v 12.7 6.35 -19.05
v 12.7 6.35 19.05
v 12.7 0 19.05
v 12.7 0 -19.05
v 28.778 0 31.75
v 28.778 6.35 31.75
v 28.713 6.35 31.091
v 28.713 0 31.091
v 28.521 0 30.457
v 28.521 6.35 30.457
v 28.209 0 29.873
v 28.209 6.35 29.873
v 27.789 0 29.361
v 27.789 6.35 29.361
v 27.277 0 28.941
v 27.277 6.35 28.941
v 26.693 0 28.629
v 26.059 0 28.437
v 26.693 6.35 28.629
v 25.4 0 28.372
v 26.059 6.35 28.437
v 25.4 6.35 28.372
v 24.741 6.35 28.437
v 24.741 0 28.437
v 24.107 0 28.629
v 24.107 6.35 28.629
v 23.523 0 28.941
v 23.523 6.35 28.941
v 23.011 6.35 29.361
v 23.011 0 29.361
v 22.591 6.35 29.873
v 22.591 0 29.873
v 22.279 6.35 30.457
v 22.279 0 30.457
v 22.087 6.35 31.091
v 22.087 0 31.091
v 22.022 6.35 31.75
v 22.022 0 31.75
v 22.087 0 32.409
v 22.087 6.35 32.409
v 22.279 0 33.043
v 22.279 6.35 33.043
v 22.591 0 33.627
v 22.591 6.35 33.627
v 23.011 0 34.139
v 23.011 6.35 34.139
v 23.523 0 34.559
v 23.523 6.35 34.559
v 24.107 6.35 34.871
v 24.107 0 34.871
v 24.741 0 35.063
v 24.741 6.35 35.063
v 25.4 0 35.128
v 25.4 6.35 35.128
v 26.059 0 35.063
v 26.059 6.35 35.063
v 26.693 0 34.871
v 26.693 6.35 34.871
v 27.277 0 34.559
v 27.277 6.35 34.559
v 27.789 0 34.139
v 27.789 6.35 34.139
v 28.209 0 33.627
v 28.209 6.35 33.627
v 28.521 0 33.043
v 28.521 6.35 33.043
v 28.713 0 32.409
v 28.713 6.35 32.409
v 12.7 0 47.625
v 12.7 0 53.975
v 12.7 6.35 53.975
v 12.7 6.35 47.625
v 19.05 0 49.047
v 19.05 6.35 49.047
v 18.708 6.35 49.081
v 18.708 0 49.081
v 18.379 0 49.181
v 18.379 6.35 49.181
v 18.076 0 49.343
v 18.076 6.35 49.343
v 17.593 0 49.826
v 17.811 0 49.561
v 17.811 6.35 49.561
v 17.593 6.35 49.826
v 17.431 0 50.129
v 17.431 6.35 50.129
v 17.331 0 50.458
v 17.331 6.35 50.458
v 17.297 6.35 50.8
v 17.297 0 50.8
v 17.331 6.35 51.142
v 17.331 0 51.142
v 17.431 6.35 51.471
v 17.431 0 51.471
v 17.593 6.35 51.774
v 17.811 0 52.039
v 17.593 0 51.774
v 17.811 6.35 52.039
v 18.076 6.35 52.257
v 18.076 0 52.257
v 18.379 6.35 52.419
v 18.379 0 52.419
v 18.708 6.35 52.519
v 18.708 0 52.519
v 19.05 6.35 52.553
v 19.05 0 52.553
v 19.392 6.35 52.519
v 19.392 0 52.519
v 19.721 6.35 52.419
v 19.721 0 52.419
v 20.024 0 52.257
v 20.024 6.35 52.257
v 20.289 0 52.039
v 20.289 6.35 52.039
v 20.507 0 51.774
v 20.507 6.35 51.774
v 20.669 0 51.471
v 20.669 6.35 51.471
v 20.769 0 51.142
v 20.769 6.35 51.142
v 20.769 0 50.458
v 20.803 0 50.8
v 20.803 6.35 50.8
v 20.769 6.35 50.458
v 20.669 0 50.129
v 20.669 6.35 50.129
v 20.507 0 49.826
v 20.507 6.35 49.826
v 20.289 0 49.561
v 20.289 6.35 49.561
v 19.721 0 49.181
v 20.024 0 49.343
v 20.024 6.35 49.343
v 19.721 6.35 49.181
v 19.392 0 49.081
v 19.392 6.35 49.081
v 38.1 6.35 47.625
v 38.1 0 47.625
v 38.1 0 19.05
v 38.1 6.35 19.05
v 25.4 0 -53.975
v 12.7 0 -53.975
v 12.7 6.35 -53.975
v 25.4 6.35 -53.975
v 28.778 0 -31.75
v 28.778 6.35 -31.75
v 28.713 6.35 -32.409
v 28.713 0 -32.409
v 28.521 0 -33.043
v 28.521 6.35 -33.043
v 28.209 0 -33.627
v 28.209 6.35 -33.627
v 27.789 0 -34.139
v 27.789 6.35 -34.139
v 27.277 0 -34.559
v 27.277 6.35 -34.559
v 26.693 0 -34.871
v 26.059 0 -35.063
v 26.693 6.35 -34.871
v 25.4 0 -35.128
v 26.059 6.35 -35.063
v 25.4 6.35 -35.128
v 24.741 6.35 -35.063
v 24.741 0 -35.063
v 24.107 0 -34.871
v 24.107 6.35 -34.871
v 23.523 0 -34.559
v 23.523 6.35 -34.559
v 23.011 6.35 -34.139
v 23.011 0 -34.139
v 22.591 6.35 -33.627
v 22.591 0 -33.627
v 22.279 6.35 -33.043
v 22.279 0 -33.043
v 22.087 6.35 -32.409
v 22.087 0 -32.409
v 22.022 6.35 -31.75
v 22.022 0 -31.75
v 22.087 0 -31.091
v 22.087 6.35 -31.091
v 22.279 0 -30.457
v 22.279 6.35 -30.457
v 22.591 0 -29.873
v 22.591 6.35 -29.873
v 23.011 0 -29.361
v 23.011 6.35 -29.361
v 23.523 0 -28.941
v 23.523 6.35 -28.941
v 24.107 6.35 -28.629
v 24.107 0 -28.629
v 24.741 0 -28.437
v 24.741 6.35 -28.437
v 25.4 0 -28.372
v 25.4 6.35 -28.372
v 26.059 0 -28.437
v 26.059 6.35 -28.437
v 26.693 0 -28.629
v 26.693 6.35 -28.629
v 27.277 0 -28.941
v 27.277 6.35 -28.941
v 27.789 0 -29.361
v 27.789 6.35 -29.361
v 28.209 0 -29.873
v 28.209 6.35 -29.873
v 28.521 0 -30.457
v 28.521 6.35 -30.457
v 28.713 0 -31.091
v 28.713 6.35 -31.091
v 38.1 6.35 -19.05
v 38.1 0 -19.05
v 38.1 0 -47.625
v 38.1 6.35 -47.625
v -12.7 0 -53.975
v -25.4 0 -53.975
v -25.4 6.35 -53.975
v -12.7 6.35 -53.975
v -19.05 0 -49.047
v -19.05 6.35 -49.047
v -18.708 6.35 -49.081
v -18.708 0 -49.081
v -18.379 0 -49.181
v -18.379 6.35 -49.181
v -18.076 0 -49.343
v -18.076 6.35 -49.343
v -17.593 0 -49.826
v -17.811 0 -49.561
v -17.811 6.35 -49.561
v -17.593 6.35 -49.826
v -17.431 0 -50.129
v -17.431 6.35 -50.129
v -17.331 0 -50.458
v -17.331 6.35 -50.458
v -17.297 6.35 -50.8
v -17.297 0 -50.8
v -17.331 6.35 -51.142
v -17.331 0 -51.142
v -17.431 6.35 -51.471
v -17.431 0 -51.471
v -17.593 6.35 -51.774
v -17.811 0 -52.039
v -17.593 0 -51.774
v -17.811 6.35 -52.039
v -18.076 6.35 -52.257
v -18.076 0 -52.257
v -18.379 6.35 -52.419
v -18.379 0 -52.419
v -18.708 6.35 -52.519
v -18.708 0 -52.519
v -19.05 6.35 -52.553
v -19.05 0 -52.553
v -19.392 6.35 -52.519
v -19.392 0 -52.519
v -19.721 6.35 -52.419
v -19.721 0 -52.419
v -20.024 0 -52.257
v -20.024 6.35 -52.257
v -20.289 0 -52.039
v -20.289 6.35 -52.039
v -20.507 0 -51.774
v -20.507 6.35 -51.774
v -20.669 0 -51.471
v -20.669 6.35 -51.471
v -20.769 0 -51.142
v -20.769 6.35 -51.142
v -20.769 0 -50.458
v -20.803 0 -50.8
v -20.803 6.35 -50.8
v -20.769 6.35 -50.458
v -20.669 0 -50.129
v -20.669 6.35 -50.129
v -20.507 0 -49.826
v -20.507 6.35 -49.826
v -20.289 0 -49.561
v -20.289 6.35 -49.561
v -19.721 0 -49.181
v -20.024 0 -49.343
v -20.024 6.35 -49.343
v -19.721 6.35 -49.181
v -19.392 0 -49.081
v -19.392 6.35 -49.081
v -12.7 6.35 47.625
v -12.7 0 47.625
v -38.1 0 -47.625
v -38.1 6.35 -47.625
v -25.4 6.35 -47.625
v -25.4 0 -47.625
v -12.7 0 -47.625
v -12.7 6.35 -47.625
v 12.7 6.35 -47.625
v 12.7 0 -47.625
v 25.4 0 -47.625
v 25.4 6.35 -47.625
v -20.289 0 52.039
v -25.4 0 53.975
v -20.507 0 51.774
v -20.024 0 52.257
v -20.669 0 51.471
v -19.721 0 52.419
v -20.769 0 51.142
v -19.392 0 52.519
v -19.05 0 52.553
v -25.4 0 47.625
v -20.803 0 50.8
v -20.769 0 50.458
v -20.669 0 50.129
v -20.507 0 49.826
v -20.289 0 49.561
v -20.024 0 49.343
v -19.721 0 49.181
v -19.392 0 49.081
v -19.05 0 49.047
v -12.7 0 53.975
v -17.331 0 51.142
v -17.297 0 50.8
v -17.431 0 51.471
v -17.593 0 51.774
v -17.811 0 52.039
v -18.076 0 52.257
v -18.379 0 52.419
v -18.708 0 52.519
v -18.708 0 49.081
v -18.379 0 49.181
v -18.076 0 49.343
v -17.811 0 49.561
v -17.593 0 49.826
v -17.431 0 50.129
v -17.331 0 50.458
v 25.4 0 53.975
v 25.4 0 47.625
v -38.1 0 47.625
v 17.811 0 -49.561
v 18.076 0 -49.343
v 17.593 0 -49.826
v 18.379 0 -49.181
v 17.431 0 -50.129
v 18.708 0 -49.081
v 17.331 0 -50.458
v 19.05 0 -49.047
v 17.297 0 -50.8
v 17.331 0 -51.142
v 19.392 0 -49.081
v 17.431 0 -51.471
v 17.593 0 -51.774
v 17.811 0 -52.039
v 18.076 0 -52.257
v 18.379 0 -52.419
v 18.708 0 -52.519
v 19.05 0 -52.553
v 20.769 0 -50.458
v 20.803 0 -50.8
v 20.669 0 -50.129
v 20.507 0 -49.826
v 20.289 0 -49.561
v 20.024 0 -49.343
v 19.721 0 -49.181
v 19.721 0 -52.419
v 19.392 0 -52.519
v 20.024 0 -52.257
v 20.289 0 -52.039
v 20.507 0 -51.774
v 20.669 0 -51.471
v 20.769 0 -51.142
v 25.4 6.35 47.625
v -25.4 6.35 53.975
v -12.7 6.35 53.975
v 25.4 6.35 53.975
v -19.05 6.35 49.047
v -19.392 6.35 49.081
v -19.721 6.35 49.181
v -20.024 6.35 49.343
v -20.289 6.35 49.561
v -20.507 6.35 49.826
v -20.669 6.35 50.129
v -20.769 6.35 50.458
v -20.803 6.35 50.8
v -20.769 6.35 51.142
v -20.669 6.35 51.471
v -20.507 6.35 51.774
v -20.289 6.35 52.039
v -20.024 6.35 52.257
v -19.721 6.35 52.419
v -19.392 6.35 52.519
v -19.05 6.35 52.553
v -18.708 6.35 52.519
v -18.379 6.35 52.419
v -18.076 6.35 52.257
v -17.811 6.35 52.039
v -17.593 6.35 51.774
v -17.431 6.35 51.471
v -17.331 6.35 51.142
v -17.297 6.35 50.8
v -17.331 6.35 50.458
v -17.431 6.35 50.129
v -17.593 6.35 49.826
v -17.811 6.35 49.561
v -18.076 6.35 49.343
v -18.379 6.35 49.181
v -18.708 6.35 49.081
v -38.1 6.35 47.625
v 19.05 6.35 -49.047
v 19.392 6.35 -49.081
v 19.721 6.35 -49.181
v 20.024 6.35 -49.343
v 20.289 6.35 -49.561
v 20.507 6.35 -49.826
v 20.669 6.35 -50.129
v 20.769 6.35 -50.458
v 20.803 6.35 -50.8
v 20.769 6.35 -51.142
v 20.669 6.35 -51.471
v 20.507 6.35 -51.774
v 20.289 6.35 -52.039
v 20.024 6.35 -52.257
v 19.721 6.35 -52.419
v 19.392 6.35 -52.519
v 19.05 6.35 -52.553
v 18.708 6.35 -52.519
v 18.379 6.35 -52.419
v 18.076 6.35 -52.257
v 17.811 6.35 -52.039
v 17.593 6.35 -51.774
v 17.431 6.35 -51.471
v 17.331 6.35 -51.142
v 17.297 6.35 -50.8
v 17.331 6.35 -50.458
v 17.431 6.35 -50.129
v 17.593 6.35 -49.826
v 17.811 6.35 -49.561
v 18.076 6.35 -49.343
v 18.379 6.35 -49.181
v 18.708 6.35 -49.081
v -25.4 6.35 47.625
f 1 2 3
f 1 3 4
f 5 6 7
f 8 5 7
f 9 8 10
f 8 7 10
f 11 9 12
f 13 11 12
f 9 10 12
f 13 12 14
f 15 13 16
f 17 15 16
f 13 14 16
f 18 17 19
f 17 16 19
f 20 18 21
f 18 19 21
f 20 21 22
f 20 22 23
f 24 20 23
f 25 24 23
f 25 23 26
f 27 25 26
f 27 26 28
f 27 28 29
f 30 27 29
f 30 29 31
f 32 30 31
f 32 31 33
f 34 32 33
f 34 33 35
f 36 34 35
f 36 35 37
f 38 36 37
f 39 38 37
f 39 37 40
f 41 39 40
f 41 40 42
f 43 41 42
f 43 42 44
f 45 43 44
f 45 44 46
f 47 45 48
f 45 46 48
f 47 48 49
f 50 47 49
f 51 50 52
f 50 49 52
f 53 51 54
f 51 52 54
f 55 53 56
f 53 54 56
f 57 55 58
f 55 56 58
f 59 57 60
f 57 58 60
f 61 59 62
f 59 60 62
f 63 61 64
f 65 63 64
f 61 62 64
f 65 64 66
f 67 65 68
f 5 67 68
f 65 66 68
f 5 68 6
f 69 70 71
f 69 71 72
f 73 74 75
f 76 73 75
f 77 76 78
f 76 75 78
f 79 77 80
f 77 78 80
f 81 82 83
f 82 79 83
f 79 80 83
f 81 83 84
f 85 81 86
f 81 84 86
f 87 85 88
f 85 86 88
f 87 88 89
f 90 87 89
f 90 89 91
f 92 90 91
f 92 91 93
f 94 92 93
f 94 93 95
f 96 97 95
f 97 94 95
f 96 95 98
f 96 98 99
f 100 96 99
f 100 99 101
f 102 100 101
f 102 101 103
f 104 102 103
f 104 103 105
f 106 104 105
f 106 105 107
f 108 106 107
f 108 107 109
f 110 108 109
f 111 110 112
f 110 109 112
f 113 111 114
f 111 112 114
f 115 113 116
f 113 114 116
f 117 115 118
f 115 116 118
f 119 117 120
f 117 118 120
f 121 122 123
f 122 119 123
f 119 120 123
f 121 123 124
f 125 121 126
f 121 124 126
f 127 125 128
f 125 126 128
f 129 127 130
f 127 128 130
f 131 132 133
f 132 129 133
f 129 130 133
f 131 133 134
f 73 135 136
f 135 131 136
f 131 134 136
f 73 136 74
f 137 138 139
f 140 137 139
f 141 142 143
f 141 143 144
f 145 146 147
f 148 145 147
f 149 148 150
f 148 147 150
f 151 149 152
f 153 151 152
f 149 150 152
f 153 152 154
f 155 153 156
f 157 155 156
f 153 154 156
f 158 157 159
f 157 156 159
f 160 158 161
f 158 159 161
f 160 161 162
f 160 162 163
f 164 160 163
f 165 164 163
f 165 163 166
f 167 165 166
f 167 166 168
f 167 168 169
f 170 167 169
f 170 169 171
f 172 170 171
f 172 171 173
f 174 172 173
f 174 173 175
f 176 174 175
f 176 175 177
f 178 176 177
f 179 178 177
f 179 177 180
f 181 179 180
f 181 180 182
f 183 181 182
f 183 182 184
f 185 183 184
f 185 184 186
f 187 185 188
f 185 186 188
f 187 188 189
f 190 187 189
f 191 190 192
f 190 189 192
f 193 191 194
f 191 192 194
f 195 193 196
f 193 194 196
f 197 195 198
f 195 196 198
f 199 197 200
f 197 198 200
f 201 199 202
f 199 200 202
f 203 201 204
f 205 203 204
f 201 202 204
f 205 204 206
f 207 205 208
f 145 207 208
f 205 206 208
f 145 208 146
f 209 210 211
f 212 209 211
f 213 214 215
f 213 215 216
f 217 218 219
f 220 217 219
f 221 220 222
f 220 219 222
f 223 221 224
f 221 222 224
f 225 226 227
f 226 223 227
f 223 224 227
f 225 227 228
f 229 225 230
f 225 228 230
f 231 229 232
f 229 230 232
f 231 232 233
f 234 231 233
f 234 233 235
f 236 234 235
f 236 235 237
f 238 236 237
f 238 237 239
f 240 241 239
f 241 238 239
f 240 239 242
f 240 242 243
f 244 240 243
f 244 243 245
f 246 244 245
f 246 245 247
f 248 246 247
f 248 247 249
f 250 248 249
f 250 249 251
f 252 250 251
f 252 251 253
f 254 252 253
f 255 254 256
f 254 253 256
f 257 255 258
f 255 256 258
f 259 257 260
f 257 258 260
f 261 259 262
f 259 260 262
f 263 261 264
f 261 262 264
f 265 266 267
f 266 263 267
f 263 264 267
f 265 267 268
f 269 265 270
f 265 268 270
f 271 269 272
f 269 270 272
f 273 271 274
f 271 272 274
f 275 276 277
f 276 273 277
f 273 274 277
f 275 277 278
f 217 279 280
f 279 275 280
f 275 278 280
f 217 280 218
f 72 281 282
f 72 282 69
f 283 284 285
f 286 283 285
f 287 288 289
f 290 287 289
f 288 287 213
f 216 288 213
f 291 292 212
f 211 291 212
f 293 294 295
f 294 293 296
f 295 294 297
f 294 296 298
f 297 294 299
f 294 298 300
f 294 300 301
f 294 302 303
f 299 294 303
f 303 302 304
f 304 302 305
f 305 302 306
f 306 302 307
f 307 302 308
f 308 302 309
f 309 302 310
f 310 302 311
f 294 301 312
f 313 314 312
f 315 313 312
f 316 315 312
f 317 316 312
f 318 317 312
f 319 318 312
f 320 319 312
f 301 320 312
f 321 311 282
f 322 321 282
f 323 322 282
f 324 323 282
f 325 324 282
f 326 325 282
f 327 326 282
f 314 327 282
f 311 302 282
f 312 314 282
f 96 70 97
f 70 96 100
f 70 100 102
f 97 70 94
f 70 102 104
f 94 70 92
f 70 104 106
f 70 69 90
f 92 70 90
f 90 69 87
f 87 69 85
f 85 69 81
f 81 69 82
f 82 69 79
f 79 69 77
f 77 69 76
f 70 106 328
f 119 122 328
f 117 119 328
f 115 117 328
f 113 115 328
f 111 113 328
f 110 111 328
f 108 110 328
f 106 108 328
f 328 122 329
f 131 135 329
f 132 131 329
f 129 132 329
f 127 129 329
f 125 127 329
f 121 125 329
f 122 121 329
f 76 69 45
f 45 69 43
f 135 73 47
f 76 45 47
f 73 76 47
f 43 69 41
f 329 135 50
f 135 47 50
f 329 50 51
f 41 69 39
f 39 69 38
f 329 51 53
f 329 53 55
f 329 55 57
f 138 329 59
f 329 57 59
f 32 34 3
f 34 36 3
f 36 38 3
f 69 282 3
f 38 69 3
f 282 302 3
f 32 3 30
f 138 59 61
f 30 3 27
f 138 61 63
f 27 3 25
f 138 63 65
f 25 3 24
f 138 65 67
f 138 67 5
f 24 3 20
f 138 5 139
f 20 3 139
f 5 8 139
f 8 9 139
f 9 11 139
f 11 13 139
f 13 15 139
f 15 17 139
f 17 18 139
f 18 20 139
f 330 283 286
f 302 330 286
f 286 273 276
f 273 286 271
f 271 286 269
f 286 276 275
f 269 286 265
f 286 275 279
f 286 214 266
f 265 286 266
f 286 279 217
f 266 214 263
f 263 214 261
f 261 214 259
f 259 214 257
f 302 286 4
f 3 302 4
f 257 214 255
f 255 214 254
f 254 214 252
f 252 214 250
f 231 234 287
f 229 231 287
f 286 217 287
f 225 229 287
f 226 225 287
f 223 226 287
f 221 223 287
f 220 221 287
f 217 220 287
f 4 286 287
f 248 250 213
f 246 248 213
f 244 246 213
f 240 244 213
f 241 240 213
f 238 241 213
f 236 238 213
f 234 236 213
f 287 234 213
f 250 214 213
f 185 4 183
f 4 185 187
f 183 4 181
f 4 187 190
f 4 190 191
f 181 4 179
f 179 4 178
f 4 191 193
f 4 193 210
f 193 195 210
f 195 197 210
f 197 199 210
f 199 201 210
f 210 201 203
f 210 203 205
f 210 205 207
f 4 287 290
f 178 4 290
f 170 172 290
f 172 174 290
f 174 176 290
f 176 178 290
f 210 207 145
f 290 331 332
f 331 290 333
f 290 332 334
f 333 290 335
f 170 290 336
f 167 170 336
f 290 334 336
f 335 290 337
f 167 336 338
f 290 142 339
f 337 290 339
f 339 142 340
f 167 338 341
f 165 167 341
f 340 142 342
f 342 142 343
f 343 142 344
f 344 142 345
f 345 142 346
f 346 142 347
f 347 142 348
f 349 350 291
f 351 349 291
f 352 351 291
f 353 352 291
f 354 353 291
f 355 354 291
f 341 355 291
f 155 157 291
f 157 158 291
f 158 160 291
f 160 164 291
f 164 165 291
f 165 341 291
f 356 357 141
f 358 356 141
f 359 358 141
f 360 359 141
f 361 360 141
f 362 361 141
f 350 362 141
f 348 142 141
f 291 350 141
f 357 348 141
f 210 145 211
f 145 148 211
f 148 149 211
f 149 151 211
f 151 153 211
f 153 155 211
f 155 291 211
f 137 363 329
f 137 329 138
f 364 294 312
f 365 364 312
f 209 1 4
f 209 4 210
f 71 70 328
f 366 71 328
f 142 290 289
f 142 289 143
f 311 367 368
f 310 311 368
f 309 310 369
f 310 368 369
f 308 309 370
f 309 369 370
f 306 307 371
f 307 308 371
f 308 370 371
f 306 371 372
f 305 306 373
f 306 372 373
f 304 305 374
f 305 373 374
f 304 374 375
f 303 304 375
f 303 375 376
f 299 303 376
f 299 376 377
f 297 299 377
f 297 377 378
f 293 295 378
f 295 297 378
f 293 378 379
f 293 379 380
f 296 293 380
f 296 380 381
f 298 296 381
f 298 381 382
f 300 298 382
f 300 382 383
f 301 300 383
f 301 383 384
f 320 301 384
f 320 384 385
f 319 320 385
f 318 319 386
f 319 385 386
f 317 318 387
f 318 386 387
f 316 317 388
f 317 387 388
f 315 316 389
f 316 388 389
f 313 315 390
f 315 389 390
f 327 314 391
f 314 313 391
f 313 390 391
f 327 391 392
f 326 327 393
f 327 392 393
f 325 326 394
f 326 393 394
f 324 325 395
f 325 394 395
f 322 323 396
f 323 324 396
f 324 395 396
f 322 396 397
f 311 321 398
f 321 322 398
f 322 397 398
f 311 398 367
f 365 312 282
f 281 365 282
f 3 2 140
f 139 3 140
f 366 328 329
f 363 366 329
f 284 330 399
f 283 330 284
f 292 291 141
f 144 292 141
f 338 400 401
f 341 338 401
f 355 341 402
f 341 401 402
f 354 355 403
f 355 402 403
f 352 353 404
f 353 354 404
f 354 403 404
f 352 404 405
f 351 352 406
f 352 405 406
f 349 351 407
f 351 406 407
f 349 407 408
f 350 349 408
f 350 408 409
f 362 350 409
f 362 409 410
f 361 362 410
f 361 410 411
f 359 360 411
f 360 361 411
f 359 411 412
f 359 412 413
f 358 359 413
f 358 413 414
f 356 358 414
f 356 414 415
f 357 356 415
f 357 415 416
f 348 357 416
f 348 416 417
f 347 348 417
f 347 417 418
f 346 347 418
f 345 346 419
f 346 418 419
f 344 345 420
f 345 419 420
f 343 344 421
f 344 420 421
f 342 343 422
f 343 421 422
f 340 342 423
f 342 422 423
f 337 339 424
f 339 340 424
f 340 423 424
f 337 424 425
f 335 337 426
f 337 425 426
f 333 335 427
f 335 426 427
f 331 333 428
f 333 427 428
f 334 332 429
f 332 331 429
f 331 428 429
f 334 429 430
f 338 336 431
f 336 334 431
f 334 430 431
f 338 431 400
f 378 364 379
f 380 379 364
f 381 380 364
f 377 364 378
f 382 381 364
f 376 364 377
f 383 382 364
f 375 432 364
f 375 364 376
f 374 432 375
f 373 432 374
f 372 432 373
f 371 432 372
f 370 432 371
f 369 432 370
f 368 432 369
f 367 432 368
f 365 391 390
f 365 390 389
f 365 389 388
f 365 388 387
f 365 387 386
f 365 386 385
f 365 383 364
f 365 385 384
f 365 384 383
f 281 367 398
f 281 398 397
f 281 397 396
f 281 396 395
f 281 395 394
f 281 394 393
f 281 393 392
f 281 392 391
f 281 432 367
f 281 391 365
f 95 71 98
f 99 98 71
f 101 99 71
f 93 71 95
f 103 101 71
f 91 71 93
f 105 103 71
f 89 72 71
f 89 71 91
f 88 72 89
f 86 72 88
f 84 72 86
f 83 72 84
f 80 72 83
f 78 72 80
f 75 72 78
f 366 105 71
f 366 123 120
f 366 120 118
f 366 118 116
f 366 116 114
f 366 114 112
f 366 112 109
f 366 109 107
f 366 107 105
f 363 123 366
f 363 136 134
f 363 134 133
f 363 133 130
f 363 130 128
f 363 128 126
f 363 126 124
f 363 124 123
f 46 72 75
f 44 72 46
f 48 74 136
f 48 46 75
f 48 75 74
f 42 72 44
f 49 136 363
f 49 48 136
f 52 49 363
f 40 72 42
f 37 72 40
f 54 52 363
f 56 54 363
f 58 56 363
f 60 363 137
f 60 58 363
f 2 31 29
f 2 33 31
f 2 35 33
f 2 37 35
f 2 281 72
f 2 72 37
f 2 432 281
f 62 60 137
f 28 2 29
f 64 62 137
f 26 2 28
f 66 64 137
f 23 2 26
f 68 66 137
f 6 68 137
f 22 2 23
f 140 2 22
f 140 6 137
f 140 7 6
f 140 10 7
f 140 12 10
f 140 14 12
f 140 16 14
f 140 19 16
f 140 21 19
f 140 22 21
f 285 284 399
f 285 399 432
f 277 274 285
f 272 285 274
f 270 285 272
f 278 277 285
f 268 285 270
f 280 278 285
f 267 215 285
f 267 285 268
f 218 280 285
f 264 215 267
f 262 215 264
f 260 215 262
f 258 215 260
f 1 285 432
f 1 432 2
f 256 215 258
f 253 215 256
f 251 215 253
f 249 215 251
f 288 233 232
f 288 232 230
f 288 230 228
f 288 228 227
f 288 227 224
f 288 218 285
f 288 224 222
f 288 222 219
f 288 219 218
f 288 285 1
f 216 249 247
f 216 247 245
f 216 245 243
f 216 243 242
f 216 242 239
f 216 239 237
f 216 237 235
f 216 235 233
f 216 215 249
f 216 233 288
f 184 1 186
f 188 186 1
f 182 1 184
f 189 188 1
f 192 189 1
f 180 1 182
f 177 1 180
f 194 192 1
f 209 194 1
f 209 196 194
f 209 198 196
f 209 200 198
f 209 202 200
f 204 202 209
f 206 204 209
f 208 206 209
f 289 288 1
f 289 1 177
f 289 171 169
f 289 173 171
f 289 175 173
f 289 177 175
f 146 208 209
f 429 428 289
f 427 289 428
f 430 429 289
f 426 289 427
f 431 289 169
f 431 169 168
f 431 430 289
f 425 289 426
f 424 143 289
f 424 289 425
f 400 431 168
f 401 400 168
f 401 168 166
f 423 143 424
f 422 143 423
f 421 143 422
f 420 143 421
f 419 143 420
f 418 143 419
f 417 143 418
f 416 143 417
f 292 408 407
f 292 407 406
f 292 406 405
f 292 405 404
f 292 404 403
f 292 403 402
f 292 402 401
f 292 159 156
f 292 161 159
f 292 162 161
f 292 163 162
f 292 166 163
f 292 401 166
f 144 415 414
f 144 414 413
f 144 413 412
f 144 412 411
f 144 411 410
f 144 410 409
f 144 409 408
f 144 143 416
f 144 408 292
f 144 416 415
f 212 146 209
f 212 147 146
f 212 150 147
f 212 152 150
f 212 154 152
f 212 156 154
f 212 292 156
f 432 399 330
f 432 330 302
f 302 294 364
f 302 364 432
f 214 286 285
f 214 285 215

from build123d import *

# Parameters (mm, degrees)
SKETCH1_W                 = 76.2
SKETCH1_H                 = 107.95
BOSS_EXTRUDE1_DEPTH       = 6.35
SKETCH2_R                 = 1.7526
SKETCH2_W                 = 12.7
SKETCH2_H                 = 6.35
SKETCH2_W_2               = 25.4
CUT_EXTRUDE1_DEPTH        = 6.35
CUT_EXTRUDE2_REACH        = 68.372
SKETCH3_W                 = 25.4
SKETCH3_H                 = 38.1
F_6_CLEARANCE_HOLE1_D     = 3.5052
F_6_CLEARANCE_HOLE1_DEPTH = 6.35
F_6_CLEARANCE_HOLE1_TIP   = 1.053068321
F_1_4_CLEARANCE_HOLE1_D   = 6.7564


with BuildPart() as part:
    # Sketch1 → Boss-Extrude1 (new body)
    with BuildSketch(Plane(origin=(0, 0, 0), x_dir=(1, 0, 0), z_dir=(0, 1, 0))):
        Rectangle(SKETCH1_W, SKETCH1_H)
    extrude(amount=BOSS_EXTRUDE1_DEPTH)

    # Sketch2 → Cut-Extrude1 (cut)
    with BuildSketch(Plane(origin=(0, 6.35, 0), x_dir=(1, 0, 0), z_dir=(0, 1, 0))):
        with Locations(Location((-19.05, 50.8, 0), (0, 0, 270))):
            Circle(SKETCH2_R)
        with Locations(Location((19.05, 50.8, 0), (0, 0, 270))):
            Circle(SKETCH2_R)
        with Locations(Location((19.05, -50.8, 0), (0, 0, 90))):
            Circle(SKETCH2_R)
        with Locations(Location((-19.05, -50.8, 0), (0, 0, 90))):
            Circle(SKETCH2_R)
        with Locations((-31.75, 50.8)):
            Rectangle(SKETCH2_W, SKETCH2_H)
        with Locations((0, 50.8)):
            Rectangle(SKETCH2_W_2, SKETCH2_H)
        with Locations((31.75, 50.8)):
            Rectangle(SKETCH2_W, SKETCH2_H)
        with Locations((31.75, -50.8)):
            Rectangle(SKETCH2_W, SKETCH2_H)
        with Locations((0, -50.8)):
            Rectangle(SKETCH2_W_2, SKETCH2_H)
        with Locations((-31.75, -50.8)):
            Rectangle(SKETCH2_W, SKETCH2_H)
    extrude(amount=-CUT_EXTRUDE1_DEPTH, mode=Mode.SUBTRACT)

    # Sketch3 → Cut-Extrude2 (cut, up to next)
    with BuildSketch(Plane(origin=(0, 6.35, 0), x_dir=(1, 0, 0), z_dir=(0, 1, 0)), mode=Mode.PRIVATE) as cut_extrude2_sk1:
        with Locations((25.4, 0)):
            Rectangle(SKETCH3_W, SKETCH3_H)
    cut_extrude2_tool1 = extrude(cut_extrude2_sk1.sketch, amount=-CUT_EXTRUDE2_REACH, mode=Mode.PRIVATE) & part.part
    add(cut_extrude2_tool1.solids().sort_by_distance((25.4, 6.35, 0))[0], mode=Mode.SUBTRACT)

    # #6 Clearance Hole1
    with Locations(Plane(origin=(0, 6.35, 0), x_dir=(1, 0, 0), z_dir=(0, 1, 0))):
        with Locations((-19.05, 50.8), (19.05, 50.8), (-19.05, -50.8), (19.05, -50.8)):
            Hole(F_6_CLEARANCE_HOLE1_D / 2, depth=F_6_CLEARANCE_HOLE1_DEPTH)
            with Locations((0, 0, -(F_6_CLEARANCE_HOLE1_DEPTH + F_6_CLEARANCE_HOLE1_TIP / 2))):  # 118° drill point
                Cone(0, F_6_CLEARANCE_HOLE1_D / 2, F_6_CLEARANCE_HOLE1_TIP, mode=Mode.SUBTRACT)

    # 1/4 Clearance Hole1 (through all)
    with Locations(Plane(origin=(0, 0, 0), x_dir=(-1, 0, 0), z_dir=(0, -1, 0))):
        with Locations((-25.4, 31.75), (-25.4, -31.75)):
            Hole(F_1_4_CLEARANCE_HOLE1_D / 2)


solid = part.part
